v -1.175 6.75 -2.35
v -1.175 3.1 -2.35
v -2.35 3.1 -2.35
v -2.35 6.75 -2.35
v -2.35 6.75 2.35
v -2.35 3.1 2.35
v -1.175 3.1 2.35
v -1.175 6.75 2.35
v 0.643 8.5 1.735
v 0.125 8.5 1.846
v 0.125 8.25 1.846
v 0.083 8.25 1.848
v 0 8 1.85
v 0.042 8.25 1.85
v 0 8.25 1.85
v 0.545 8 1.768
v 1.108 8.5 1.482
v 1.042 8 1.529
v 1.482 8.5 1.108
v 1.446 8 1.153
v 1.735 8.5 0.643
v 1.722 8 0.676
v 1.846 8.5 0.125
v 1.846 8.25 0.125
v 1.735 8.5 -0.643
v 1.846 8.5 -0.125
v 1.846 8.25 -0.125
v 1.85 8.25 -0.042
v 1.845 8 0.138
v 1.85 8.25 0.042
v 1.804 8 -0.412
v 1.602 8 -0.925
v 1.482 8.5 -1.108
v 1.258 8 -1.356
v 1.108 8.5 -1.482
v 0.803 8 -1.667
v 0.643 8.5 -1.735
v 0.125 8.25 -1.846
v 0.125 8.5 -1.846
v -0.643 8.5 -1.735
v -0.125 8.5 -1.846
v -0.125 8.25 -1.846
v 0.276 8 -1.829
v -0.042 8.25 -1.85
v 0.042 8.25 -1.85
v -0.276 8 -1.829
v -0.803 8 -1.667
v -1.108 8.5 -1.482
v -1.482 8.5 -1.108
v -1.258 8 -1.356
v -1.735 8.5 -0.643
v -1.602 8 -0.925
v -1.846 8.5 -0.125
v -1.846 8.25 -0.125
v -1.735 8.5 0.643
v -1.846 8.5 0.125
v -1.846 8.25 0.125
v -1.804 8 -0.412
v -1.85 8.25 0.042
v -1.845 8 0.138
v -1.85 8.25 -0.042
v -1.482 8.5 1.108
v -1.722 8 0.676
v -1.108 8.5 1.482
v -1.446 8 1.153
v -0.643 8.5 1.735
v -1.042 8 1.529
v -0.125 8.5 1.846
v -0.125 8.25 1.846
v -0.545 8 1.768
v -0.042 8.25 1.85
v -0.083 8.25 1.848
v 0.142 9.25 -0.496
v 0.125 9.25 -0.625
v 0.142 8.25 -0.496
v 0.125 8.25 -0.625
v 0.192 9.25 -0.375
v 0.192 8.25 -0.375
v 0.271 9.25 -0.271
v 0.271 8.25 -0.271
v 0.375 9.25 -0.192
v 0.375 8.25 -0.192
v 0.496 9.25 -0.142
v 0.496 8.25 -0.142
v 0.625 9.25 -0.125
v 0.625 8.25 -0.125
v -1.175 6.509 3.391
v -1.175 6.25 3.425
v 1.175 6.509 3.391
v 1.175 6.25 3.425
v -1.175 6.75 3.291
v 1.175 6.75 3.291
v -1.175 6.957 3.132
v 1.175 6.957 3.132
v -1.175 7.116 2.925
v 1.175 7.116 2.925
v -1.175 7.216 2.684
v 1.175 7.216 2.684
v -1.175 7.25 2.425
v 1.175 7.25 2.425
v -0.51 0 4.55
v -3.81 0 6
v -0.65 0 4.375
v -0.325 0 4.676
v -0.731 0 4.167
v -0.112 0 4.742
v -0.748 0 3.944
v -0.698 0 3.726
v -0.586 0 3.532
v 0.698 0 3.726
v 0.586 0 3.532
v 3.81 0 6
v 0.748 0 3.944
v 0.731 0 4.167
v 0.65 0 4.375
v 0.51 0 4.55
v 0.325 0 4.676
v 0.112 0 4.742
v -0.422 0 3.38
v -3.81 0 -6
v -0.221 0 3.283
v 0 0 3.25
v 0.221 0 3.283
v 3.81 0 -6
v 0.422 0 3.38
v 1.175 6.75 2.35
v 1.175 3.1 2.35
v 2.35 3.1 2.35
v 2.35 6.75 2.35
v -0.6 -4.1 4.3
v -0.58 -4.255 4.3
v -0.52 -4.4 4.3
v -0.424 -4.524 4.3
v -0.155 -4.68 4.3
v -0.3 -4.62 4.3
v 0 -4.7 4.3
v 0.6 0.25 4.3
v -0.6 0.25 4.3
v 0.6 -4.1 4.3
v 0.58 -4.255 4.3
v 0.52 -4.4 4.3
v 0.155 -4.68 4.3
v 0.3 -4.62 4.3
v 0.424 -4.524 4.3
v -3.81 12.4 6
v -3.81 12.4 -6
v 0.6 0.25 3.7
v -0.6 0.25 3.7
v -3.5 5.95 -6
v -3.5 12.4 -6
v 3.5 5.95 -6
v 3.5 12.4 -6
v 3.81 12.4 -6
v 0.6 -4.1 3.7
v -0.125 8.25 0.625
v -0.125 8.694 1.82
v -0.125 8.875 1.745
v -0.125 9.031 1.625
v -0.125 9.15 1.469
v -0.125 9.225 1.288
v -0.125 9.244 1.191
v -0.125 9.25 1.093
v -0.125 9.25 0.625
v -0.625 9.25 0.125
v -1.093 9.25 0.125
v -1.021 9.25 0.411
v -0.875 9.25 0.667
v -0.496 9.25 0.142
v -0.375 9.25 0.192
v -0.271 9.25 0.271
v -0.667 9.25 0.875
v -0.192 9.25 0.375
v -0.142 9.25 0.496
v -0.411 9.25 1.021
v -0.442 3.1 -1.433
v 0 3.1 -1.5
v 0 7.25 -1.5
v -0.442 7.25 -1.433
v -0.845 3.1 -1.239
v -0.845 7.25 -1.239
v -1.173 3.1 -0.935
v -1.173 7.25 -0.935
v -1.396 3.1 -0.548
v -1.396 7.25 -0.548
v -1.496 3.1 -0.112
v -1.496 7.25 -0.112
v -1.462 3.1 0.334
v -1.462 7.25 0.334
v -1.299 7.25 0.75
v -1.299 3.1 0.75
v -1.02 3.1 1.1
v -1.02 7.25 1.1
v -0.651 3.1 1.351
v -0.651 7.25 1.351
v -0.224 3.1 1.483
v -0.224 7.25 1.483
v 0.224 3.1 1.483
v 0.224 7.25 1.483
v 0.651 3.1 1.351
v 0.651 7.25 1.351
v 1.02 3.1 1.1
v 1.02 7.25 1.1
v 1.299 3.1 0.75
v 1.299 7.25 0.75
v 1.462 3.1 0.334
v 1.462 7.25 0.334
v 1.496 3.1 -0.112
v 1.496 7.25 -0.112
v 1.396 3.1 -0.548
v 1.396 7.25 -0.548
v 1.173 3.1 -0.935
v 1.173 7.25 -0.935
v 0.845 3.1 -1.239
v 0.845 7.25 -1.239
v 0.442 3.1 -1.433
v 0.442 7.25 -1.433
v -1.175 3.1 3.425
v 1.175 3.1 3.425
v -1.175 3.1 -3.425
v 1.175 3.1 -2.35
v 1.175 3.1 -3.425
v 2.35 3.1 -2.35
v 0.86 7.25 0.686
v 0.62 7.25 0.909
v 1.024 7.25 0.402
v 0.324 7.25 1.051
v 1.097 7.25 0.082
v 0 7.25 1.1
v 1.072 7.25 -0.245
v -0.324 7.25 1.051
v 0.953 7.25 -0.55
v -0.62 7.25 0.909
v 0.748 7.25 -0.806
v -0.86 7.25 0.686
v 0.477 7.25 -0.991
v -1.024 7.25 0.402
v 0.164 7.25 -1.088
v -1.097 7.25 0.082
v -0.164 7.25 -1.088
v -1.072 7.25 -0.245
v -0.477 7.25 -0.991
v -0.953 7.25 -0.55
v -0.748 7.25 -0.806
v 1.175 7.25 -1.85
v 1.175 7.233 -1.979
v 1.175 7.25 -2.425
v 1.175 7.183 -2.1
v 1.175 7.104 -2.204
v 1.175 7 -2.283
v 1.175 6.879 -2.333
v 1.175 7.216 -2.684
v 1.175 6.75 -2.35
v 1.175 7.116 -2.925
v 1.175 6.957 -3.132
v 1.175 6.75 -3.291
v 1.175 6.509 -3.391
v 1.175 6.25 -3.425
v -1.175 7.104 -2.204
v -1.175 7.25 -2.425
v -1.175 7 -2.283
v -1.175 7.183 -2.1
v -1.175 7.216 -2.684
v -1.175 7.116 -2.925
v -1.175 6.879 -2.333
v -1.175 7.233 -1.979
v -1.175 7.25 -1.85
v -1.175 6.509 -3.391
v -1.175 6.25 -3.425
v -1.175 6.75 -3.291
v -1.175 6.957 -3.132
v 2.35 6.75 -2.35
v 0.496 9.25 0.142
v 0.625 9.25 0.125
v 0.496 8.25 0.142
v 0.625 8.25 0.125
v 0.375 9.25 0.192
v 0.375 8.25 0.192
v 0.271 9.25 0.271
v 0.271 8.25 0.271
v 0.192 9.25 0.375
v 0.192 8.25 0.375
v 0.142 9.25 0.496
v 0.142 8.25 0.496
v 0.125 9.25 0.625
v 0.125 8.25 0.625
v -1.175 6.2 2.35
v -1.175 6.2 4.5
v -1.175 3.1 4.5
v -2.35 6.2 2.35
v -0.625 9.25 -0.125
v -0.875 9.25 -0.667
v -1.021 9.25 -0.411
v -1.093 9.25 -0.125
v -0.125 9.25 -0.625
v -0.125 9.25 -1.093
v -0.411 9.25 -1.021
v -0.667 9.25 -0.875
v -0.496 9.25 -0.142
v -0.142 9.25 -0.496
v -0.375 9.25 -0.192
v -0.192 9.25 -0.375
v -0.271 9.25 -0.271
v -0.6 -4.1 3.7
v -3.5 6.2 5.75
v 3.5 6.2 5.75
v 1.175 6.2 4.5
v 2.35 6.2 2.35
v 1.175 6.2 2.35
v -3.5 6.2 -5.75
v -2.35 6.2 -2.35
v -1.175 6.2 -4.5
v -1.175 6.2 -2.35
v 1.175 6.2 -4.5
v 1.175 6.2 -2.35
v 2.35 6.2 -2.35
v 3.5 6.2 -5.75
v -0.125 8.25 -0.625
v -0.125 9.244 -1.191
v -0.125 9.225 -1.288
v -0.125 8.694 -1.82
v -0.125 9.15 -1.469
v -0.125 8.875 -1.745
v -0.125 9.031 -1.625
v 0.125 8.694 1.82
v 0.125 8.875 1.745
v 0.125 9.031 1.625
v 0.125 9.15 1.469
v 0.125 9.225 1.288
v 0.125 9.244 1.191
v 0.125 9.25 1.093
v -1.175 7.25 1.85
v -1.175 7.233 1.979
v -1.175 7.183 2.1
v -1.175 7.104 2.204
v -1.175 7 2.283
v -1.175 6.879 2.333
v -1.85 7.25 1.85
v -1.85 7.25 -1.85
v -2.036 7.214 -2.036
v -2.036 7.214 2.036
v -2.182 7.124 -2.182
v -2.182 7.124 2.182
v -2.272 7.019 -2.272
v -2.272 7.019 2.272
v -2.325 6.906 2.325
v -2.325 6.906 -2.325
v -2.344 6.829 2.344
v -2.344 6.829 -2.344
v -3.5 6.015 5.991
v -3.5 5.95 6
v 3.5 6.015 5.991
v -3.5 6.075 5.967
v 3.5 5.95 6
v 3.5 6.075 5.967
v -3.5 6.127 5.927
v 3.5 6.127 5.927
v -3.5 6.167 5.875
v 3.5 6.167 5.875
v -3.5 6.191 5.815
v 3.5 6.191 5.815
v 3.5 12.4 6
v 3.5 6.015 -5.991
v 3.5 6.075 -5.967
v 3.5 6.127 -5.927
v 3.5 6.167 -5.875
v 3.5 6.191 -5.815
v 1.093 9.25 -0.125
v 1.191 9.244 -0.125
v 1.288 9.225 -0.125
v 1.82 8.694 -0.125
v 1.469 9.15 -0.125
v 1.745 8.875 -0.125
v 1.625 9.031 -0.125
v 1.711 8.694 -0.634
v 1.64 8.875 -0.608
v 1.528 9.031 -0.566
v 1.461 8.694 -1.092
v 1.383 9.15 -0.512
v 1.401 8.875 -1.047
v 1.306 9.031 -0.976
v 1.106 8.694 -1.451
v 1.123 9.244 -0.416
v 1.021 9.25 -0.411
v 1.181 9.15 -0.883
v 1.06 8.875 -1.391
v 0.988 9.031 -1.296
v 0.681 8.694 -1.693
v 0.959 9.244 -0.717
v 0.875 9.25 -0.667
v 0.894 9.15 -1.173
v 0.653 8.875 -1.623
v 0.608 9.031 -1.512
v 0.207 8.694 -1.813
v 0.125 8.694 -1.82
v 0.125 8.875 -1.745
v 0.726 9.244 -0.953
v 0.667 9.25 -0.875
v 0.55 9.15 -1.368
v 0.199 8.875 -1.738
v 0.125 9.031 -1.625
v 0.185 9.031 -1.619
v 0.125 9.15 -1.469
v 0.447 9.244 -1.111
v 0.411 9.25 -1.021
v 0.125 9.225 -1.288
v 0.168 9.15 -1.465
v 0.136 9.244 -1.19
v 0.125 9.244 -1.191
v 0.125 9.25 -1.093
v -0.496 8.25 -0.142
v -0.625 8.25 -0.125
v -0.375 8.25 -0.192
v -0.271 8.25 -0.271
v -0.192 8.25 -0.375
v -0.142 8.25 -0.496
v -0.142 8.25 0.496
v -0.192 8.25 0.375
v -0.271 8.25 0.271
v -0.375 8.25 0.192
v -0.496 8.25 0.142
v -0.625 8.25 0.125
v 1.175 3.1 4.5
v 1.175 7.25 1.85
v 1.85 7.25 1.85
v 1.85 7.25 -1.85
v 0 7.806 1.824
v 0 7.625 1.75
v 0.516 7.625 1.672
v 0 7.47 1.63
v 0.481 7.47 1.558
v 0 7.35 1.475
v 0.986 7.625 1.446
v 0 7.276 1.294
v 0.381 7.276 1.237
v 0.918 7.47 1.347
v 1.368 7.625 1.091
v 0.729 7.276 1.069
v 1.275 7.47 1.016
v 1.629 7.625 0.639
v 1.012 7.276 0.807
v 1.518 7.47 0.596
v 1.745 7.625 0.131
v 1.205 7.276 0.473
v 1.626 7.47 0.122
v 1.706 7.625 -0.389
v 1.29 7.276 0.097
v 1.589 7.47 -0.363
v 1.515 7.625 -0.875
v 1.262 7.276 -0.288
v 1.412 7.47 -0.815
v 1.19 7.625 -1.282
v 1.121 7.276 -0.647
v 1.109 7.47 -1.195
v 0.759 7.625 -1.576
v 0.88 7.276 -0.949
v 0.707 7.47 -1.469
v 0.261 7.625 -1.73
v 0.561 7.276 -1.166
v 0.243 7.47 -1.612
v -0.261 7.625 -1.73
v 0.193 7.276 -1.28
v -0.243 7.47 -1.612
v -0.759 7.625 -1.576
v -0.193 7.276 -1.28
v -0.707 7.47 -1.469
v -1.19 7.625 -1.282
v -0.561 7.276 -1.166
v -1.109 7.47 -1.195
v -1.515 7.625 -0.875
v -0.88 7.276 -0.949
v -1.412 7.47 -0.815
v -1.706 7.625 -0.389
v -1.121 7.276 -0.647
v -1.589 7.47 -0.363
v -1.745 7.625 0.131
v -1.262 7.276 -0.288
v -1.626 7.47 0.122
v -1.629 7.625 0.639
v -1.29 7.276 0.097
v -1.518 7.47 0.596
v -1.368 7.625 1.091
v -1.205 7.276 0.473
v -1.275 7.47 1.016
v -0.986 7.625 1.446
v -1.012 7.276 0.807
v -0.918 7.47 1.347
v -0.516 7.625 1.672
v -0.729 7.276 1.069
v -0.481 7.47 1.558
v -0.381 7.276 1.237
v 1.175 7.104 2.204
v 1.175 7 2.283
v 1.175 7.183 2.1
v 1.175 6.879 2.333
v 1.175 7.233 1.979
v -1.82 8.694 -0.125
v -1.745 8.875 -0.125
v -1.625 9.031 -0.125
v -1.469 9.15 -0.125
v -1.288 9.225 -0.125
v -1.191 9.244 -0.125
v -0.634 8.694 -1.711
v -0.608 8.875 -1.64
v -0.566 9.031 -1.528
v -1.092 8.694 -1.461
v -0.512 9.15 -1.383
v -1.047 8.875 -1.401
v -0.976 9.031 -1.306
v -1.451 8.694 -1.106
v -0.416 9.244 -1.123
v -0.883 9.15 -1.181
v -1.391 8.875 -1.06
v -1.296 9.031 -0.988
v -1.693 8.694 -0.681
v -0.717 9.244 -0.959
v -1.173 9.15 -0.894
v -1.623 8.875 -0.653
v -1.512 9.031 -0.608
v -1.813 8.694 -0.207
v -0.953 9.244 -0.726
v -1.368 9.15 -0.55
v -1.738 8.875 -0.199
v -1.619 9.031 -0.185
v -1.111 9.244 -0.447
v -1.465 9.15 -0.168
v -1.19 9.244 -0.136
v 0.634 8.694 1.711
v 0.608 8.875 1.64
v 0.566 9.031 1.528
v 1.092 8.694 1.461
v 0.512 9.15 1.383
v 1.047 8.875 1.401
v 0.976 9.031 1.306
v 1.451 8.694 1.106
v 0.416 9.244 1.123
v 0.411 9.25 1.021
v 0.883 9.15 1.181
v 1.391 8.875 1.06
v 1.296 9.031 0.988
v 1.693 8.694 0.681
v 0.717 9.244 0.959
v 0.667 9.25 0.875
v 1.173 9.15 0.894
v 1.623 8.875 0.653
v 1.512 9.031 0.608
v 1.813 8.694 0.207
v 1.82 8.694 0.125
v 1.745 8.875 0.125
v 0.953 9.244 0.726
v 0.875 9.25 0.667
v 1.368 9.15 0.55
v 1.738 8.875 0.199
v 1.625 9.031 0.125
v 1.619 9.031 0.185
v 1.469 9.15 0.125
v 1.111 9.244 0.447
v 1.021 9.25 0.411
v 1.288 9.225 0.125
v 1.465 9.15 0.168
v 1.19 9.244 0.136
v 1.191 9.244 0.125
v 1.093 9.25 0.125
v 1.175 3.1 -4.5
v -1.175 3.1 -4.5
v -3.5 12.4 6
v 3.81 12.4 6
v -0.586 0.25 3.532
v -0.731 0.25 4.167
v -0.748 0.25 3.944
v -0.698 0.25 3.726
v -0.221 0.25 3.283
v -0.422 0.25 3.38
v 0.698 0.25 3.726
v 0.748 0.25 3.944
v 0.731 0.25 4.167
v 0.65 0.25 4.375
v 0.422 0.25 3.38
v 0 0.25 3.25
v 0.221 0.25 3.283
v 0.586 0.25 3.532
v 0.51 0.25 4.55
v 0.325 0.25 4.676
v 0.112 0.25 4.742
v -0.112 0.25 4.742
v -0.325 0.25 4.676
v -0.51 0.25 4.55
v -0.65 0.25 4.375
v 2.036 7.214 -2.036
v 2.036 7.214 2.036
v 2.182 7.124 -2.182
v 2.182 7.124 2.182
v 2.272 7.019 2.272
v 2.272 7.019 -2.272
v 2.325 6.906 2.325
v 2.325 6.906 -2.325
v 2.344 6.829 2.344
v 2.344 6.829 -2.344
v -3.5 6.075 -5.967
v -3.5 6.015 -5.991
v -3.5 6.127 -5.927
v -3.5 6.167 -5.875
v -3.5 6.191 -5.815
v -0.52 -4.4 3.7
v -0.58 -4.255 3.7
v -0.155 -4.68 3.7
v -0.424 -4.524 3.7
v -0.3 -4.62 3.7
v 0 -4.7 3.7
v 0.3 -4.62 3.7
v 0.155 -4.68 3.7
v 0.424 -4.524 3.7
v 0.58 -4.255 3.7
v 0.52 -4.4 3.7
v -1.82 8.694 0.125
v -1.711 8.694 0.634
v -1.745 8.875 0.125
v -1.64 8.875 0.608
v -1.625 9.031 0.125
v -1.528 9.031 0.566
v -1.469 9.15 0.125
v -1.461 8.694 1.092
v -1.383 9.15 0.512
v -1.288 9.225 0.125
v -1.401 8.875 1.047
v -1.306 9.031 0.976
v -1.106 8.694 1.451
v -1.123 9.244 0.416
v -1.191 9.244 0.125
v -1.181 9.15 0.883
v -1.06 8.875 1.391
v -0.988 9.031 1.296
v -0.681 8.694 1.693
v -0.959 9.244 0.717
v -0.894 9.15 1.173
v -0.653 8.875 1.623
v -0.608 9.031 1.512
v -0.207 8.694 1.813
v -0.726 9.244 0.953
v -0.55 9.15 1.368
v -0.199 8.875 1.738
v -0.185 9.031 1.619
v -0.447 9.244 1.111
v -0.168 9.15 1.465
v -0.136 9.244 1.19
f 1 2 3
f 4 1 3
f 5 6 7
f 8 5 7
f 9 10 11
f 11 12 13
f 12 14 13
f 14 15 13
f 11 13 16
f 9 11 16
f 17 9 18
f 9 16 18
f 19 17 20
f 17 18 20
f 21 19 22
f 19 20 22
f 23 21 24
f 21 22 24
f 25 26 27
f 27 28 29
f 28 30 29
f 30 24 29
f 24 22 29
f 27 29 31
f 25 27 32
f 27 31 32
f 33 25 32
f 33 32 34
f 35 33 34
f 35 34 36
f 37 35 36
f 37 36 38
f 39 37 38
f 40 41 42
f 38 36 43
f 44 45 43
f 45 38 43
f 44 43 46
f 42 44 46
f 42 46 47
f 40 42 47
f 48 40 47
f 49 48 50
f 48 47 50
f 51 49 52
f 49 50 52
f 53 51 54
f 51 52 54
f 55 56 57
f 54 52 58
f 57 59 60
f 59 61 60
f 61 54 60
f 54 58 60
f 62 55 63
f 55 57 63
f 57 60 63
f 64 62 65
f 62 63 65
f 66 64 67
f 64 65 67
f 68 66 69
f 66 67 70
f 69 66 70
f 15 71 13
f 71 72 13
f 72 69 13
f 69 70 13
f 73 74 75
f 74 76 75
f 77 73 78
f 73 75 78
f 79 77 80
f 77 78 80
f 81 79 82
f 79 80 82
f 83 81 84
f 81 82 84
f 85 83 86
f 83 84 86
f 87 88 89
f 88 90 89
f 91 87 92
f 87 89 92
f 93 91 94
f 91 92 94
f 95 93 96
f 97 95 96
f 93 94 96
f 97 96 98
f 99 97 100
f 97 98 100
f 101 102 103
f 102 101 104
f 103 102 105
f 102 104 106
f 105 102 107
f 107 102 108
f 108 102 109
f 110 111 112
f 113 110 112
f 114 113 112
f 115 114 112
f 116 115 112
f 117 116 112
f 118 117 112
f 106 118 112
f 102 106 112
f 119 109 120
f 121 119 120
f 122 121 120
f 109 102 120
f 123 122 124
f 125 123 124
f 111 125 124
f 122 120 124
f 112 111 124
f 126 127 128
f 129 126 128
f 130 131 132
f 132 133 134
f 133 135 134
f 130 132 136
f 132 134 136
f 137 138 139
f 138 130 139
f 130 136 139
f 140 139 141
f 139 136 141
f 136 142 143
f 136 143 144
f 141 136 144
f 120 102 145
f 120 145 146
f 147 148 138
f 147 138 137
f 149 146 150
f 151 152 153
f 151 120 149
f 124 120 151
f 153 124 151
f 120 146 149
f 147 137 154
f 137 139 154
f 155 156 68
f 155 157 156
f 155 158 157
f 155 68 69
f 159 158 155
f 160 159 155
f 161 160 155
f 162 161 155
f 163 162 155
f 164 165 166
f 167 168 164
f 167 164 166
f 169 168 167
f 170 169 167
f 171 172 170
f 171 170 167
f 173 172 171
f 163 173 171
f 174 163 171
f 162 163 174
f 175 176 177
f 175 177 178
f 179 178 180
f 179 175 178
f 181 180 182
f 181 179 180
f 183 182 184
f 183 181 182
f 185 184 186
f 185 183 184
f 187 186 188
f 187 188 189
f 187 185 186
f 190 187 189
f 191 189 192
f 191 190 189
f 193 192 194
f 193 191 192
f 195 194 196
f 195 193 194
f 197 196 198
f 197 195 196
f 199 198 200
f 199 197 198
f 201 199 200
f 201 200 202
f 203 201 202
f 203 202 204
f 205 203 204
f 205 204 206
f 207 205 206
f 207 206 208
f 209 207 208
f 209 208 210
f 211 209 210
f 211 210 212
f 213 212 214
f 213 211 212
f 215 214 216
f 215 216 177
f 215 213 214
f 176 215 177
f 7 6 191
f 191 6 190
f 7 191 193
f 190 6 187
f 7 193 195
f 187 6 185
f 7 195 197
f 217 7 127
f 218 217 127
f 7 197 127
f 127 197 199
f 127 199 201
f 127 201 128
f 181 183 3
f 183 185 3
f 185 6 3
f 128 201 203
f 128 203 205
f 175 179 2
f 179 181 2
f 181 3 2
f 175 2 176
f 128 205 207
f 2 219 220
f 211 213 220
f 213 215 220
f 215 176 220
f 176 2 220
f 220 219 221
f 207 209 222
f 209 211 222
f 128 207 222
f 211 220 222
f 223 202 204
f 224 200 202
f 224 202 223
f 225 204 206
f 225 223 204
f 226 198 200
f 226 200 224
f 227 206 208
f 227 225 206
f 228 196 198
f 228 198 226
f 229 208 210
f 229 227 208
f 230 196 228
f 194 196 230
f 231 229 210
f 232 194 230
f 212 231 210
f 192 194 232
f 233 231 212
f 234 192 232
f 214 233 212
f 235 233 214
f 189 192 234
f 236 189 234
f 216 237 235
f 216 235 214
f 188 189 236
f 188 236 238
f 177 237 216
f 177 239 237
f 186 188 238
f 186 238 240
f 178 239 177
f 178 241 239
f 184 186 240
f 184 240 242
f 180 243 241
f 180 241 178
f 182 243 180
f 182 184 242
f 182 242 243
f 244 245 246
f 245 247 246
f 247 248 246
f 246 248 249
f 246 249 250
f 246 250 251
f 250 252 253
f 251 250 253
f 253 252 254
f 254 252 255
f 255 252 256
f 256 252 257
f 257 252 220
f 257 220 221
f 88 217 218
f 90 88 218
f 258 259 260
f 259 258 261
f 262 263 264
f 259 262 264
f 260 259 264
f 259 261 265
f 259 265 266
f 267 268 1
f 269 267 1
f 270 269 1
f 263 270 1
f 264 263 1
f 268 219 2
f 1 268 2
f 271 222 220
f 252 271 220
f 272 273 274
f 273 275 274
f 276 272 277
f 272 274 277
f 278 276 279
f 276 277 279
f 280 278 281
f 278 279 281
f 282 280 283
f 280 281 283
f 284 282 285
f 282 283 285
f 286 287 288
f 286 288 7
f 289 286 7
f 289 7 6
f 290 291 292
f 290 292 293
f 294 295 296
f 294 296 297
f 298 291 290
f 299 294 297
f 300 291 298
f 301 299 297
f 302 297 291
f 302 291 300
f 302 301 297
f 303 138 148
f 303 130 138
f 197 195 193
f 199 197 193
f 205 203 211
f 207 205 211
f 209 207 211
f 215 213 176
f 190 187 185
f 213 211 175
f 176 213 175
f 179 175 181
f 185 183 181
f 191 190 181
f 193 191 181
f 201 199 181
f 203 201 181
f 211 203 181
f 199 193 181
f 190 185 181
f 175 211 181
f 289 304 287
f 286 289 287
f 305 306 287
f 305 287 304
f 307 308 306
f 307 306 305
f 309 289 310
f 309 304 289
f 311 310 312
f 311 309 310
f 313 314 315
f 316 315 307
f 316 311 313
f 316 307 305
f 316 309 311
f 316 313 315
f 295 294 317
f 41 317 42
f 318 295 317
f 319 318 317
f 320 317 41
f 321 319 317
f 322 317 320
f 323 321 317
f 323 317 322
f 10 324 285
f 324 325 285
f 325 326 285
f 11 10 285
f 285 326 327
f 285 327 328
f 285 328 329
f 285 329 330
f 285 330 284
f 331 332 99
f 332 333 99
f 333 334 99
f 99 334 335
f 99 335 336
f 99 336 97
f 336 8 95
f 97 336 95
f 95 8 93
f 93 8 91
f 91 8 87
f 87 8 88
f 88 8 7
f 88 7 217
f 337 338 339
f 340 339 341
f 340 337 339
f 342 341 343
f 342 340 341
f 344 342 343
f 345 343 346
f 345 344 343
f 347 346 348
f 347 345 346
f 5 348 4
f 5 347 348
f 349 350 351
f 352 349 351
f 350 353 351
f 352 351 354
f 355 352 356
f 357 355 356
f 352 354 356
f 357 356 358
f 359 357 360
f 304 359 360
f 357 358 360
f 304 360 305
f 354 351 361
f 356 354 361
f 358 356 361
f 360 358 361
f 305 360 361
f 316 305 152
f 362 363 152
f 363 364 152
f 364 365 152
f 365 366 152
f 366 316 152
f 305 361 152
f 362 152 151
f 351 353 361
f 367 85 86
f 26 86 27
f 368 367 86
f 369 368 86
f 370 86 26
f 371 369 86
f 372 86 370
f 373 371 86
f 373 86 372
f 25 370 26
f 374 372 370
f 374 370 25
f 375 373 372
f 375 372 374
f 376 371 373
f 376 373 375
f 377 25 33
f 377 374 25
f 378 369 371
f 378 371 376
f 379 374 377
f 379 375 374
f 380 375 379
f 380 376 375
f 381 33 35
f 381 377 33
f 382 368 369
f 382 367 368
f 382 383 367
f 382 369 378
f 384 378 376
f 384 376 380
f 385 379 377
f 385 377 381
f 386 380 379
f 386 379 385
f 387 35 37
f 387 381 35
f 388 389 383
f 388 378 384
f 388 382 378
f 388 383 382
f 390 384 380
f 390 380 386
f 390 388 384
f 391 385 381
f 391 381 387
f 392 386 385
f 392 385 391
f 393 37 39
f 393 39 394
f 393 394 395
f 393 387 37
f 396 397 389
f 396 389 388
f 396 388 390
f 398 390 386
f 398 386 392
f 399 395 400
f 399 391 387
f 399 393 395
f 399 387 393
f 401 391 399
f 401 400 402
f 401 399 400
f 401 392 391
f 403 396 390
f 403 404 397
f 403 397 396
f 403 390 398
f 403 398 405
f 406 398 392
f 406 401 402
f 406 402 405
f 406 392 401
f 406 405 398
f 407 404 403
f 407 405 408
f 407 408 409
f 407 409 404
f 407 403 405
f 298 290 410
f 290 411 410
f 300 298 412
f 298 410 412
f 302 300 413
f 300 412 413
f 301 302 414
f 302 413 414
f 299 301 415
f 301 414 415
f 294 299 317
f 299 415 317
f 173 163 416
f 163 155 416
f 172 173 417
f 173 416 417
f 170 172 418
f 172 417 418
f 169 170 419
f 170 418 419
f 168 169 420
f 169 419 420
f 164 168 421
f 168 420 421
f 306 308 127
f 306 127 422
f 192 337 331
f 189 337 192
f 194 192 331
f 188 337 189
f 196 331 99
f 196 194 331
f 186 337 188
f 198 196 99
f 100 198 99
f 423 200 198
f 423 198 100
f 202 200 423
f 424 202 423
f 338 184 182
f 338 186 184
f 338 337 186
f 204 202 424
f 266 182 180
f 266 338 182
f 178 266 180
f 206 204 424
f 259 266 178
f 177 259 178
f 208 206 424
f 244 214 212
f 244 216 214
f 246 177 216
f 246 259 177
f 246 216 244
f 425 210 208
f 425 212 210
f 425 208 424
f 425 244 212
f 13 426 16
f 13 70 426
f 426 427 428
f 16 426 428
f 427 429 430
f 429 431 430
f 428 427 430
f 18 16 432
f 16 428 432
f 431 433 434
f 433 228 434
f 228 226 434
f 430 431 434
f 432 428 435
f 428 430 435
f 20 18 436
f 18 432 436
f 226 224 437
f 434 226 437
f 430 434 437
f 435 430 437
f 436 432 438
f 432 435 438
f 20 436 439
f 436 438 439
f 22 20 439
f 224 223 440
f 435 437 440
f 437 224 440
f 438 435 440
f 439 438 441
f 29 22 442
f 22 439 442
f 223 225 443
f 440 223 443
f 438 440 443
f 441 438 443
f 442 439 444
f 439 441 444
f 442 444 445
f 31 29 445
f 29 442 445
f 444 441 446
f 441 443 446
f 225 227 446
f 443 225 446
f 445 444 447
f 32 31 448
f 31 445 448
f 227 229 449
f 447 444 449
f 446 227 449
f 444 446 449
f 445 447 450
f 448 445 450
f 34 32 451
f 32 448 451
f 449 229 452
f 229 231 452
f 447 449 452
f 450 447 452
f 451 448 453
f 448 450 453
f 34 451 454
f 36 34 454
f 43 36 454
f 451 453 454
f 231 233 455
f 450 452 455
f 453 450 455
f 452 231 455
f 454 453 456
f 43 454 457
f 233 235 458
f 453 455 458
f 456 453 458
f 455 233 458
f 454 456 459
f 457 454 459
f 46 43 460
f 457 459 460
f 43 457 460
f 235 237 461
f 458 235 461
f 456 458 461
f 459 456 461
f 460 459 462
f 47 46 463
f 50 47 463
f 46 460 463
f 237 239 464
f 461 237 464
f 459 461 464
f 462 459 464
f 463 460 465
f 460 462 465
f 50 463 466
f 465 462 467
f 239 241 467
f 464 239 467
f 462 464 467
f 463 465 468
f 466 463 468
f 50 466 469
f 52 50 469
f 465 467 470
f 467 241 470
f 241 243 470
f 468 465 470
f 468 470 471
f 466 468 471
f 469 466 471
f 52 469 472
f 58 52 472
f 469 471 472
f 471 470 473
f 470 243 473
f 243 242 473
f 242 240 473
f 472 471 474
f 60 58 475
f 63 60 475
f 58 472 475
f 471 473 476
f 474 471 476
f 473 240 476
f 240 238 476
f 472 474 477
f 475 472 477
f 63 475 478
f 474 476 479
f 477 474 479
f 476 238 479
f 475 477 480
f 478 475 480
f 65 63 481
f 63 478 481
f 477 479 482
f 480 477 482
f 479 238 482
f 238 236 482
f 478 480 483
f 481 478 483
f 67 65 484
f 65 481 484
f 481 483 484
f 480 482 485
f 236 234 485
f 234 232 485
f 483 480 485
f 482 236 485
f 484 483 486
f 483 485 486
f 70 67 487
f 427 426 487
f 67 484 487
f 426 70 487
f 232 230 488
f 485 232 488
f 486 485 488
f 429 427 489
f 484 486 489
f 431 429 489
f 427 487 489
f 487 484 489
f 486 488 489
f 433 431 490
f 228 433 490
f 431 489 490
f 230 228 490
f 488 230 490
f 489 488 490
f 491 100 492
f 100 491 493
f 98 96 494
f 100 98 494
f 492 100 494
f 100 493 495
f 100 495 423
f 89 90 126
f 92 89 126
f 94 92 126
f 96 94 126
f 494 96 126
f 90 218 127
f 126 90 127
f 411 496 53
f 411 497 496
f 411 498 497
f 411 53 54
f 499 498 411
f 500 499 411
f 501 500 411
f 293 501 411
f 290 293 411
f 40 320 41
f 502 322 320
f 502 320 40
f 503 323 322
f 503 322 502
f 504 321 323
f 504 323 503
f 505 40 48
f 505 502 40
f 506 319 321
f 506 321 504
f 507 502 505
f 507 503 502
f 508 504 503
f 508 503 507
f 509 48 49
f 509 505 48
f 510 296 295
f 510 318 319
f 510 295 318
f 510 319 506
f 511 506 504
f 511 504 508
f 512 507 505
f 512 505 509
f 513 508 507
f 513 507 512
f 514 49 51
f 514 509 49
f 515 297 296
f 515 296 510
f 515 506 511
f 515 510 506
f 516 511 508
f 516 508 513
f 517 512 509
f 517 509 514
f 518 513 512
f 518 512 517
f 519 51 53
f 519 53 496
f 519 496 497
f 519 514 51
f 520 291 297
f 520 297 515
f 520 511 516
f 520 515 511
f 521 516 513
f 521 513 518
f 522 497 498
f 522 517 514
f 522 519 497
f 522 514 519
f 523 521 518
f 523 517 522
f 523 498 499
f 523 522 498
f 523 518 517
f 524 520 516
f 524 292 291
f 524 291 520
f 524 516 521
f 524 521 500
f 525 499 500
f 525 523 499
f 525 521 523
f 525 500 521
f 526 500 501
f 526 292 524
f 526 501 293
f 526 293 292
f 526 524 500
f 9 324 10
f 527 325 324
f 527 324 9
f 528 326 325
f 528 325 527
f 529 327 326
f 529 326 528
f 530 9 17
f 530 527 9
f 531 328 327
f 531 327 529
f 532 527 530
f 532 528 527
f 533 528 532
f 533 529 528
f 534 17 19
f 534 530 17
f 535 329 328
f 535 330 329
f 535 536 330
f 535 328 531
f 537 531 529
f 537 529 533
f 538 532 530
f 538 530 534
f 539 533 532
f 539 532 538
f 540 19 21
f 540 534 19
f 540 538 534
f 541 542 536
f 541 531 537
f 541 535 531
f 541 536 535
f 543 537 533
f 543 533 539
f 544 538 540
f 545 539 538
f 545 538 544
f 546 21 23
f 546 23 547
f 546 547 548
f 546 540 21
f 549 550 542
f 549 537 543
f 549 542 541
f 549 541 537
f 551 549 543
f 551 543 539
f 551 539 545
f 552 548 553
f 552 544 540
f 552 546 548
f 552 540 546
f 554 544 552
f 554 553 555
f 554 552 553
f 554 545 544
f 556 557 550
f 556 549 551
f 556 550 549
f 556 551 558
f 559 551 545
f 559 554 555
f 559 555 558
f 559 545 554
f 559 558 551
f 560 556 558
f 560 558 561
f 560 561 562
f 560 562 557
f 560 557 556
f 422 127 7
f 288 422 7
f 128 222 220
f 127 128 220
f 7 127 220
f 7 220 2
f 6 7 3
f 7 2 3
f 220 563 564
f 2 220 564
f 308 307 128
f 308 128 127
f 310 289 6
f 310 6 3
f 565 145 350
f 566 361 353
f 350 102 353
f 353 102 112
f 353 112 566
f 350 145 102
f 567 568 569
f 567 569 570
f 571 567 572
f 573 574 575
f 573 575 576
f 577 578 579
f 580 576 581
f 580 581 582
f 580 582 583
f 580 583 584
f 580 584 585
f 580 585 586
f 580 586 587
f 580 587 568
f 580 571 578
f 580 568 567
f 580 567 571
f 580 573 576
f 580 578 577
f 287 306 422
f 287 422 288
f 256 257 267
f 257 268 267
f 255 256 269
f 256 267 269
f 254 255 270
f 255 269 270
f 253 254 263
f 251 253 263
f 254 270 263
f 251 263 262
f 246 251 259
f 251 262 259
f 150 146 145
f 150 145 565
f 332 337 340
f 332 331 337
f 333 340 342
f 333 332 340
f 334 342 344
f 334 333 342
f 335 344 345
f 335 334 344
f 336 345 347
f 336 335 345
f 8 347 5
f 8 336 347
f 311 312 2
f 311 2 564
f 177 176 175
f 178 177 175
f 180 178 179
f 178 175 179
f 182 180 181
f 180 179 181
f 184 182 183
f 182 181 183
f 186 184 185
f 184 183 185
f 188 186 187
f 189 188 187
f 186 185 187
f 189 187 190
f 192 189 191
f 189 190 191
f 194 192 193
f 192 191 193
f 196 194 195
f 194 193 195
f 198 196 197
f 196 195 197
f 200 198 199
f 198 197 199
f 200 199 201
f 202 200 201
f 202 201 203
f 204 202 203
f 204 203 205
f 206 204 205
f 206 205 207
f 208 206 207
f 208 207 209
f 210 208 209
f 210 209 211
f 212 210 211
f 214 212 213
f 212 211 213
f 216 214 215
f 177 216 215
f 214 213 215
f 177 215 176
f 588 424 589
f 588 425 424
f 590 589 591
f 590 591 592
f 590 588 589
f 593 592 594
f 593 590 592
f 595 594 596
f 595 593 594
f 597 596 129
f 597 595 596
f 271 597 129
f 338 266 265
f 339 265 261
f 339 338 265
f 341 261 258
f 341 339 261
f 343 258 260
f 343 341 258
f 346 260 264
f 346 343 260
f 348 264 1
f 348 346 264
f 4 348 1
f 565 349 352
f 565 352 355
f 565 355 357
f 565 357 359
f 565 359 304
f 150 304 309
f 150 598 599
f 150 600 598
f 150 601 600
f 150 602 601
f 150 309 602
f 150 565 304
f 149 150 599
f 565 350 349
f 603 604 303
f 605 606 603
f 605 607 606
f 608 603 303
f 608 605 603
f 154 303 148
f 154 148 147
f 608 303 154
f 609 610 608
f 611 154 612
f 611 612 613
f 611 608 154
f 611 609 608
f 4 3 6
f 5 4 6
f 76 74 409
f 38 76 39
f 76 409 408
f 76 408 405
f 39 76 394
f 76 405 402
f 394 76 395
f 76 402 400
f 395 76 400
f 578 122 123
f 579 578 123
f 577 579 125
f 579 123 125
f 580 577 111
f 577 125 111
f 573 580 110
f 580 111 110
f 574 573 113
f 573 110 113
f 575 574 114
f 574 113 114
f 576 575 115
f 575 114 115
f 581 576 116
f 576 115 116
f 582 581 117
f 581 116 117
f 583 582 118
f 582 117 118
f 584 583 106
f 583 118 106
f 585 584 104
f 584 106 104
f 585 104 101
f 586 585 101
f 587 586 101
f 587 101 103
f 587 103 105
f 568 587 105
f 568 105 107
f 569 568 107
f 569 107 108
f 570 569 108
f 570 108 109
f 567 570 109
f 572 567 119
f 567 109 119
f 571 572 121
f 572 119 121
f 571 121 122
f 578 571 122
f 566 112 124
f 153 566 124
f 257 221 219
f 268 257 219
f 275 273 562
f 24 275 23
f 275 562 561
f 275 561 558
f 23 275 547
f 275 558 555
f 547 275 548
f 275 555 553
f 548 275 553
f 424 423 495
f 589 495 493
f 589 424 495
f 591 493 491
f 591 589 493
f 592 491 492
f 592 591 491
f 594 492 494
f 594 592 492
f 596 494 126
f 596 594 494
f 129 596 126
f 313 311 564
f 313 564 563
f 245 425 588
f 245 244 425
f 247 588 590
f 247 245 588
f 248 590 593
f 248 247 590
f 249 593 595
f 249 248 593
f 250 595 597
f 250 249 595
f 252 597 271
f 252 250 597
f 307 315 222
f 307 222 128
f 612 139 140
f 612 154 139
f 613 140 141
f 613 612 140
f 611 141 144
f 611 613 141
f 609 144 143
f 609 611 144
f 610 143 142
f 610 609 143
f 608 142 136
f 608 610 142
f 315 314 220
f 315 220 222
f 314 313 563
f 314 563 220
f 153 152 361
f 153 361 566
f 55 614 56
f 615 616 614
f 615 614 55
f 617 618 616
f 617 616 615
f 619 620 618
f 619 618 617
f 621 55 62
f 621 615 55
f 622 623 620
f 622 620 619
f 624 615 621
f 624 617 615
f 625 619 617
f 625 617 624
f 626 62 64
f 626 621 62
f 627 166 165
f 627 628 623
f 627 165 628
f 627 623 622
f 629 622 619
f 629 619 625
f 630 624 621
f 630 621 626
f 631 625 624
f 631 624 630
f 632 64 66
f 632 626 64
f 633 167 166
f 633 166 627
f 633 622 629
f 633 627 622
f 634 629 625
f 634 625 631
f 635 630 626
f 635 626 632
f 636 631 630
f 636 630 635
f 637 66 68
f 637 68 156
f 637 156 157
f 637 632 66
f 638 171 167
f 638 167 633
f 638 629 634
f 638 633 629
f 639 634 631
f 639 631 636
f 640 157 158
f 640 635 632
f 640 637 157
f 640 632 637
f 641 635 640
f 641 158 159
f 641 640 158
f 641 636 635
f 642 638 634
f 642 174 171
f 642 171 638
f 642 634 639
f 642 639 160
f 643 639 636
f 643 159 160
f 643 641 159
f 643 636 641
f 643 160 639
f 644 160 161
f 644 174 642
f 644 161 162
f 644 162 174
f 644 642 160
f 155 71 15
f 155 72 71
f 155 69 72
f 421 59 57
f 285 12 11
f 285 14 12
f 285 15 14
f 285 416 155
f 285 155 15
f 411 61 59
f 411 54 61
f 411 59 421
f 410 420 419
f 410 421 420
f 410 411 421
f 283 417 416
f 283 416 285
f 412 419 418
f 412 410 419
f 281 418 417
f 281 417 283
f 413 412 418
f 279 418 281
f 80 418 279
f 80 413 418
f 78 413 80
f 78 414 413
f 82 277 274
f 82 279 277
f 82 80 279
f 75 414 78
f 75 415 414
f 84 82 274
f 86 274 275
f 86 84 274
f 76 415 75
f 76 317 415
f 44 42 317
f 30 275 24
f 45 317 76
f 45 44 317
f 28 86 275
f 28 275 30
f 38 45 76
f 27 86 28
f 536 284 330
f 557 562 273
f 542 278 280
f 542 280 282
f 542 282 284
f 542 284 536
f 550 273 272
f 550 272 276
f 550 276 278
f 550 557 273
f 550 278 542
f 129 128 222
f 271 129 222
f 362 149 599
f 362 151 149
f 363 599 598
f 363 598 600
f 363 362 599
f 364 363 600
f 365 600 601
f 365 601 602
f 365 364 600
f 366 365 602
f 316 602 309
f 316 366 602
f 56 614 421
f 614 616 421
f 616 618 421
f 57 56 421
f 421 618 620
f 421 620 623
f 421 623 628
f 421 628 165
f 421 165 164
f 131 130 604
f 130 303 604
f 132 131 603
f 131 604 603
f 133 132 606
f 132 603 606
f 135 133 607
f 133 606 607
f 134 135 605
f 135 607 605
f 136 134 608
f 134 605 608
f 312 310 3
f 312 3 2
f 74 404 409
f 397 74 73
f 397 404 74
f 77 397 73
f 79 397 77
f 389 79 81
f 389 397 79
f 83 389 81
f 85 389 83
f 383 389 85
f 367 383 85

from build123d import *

# Parameters (mm, degrees)
SKETCH_1_W          = 7.62
SKETCH_1_H          = 12
EXTRUDE_1_DEPTH     = 12.4
SKETCH_2_W          = 1.2
SKETCH_2_H          = 0.6
EXTRUDE_2_DEPTH     = 4.7
FILLET_1_R          = 0.6
SKETCH_3_W          = 7
SKETCH_3_H          = 12
CUT_EXTRUDE_1_DEPTH = 6.2
CUT_EXTRUDE_3_DEPTH = 3.1
SKETCH_5_R          = 1.5
EXTRUDE_4_DEPTH     = 4.15
SKETCH_6_R          = 1.5
EXTRUDE_5_DEPTH     = 4.15
FILLET_2_R          = 1
FILLET_3_R          = 0.5
SKETCH_7_R          = 1.85
EXTRUDE_6_DEPTH     = 2
FILLET_4_R          = 0.75
SKETCH_8_W          = 0.25
SKETCH_8_H          = 5
SKETCH_8_W_2        = 5
SKETCH_8_H_2        = 0.25
CUT_EXTRUDE_4_DEPTH = 1
FILLET_5_R          = 0.5
FILLET_6_R          = 0.25
SKETCH_9_R          = 0.75
CUT_EXTRUDE_5_DEPTH = 0.25
SKETCH_10_W         = 1.2
SKETCH_10_H         = 0.6
EXTRUDE_7_DEPTH     = 0.25


with BuildPart() as part:
    # 草图1 → 凸台-拉伸1 (new body)
    with BuildSketch(Plane(origin=(0, 0, 0), x_dir=(1, 0, 0), z_dir=(0, 1, 0))):
        Rectangle(SKETCH_1_W, SKETCH_1_H)
    extrude(amount=EXTRUDE_1_DEPTH)

    # 草图3 → 切除-拉伸1 (cut)
    with BuildSketch(Plane(origin=(0, 12.4, 0), x_dir=(1, 0, 0), z_dir=(0, 1, 0))):
        Rectangle(SKETCH_3_W, SKETCH_3_H)
    extrude(amount=-CUT_EXTRUDE_1_DEPTH, mode=Mode.SUBTRACT)

    # 草图4 → 切除-拉伸3 (cut)
    with BuildSketch(Plane(origin=(0, 6.2, 0), x_dir=(1, 0, 0), z_dir=(0, 1, 0))):
        Polygon((1.175, 2.35), (2.35, 2.35), (2.35, -2.35), (1.175, -2.35), (1.175, -4.5), (-1.175, -4.5), (-1.175, -2.35), (-2.35, -2.35), (-2.35, 2.35), (-1.175, 2.35), (-1.175, 4.5), (1.175, 4.5), align=None)
    extrude(amount=-CUT_EXTRUDE_3_DEPTH, mode=Mode.SUBTRACT)

    # 圆角6
    fillet_6_edges = [part.edges().sort_by_distance(p)[0] for p in [
        (0, 6.2, 6),
        (0, 6.2, -6),
    ]]
    fillet(fillet_6_edges, radius=FILLET_6_R)

    # 草图9 → 切除-拉伸5 (cut)
    with BuildSketch(Plane.XZ):
        with Locations(Location((0, 4, 0), (0, 0, 270))):
            Circle(SKETCH_9_R)
    extrude(amount=-CUT_EXTRUDE_5_DEPTH, mode=Mode.SUBTRACT)


with BuildPart() as body_2:
    # 草图2 → 凸台-拉伸2 (new body)
    with BuildSketch(Plane(origin=(0, 0, 0), x_dir=(-1, 0, 0), z_dir=(0, -1, 0))):
        with Locations((0, -4)):
            Rectangle(SKETCH_2_W, SKETCH_2_H)
    extrude(amount=EXTRUDE_2_DEPTH)

    # 圆角1
    fillet_1_edges = [body_2.edges().sort_by_distance(p)[0] for p in [
        (0.6, -4.7, 4),
        (-0.6, -4.7, 4),
    ]]
    fillet(fillet_1_edges, radius=FILLET_1_R - 0.0001)  # a hair under: the kernel refuses the full size

    # 草图10 → 凸台-拉伸7 (add)
    with BuildSketch(Plane(origin=(0, 0, 0), x_dir=(1, 0, 0), z_dir=(0, 1, 0))):
        with Locations((0, -4)):
            Rectangle(SKETCH_10_W, SKETCH_10_H)
    extrude(amount=EXTRUDE_7_DEPTH)


with BuildPart() as body_3:
    # 草图5 → 凸台-拉伸4 (new body)
    with BuildSketch(Plane(origin=(0, 3.1, 0), x_dir=(1, 0, 0), z_dir=(0, 1, 0))):
        Polygon((-2.35, 2.35), (-2.35, -2.35), (-1.175, -2.35), (-1.175, -3.425), (1.175, -3.425), (1.175, -2.35), (2.35, -2.35), (2.35, 2.35), (1.175, 2.35), (1.175, 3.425), (-1.175, 3.425), (-1.175, 2.35), align=None)
        with Locations(Location((0, 0, 0), (0, 0, 90))):
            Circle(SKETCH_5_R, mode=Mode.SUBTRACT)
    extrude(amount=EXTRUDE_4_DEPTH)

    # 圆角2
    fillet_2_edges = [body_3.edges().sort_by_distance(p)[0] for p in [
        (0, 7.25, 3.425),
        (0, 7.25, -3.425),
    ]]
    fillet(fillet_2_edges, radius=FILLET_2_R)

    # 圆角3
    fillet_3_edges = [body_3.edges().sort_by_distance(p)[0] for p in [
        (-1.7625, 7.25, 2.35),
        (1.7625, 7.25, 2.35),
        (2.35, 7.25, 0),
        (1.7625, 7.25, -2.35),
        (-1.7625, 7.25, -2.35),
        (-2.35, 7.25, 0),
    ]]
    fillet(fillet_3_edges, radius=FILLET_3_R)


with BuildPart() as body_4:
    # 草图6 → 凸台-拉伸5 (new body)
    with BuildSketch(Plane(origin=(0, 3.1, 0), x_dir=(1, 0, 0), z_dir=(0, 1, 0))):
        with Locations(Location((0, 0, 0), (0, 0, 90))):
            Circle(SKETCH_6_R)
    extrude(amount=EXTRUDE_5_DEPTH)


with BuildPart() as body_5:
    # 草图7 → 凸台-拉伸6 (new body)
    with BuildSketch(Plane(origin=(0, 7.25, 0), x_dir=(1, 0, 0), z_dir=(0, 1, 0))):
        with Locations(Location((0, 0, 0), (0, 0, 270))):
            Circle(SKETCH_7_R)
    extrude(amount=EXTRUDE_6_DEPTH)

    # 圆角4
    fillet_4_edges = [body_5.edges().sort_by_distance(p)[0] for p in [
        (0, 7.25, -1.85),
        (0, 9.25, -1.85),
    ]]
    fillet(fillet_4_edges, radius=FILLET_4_R)

    # 草图8 → 切除-拉伸4 (cut)
    with BuildSketch(Plane(origin=(0, 9.25, 0), x_dir=(1, 0, 0), z_dir=(0, 1, 0))):
        Rectangle(SKETCH_8_W, SKETCH_8_H)
        Rectangle(SKETCH_8_W_2, SKETCH_8_H_2)
    extrude(amount=-CUT_EXTRUDE_4_DEPTH, mode=Mode.SUBTRACT)

    # 圆角5
    fillet_5_edges = [body_5.edges().sort_by_distance(p)[0] for p in [
        (-0.125, 8.75, 0.125),
        (0.125, 8.75, -0.125),
        (0.125, 8.75, 0.125),
        (-0.125, 8.75, -0.125),
    ]]
    fillet(fillet_5_edges, radius=FILLET_5_R)


with BuildPart() as body_4_1:
    add(body_4.part)

    # Combine 1: union body 5
    add(body_5.part)


solid = Compound([part.part, body_2.part, body_3.part, body_4_1.part])
